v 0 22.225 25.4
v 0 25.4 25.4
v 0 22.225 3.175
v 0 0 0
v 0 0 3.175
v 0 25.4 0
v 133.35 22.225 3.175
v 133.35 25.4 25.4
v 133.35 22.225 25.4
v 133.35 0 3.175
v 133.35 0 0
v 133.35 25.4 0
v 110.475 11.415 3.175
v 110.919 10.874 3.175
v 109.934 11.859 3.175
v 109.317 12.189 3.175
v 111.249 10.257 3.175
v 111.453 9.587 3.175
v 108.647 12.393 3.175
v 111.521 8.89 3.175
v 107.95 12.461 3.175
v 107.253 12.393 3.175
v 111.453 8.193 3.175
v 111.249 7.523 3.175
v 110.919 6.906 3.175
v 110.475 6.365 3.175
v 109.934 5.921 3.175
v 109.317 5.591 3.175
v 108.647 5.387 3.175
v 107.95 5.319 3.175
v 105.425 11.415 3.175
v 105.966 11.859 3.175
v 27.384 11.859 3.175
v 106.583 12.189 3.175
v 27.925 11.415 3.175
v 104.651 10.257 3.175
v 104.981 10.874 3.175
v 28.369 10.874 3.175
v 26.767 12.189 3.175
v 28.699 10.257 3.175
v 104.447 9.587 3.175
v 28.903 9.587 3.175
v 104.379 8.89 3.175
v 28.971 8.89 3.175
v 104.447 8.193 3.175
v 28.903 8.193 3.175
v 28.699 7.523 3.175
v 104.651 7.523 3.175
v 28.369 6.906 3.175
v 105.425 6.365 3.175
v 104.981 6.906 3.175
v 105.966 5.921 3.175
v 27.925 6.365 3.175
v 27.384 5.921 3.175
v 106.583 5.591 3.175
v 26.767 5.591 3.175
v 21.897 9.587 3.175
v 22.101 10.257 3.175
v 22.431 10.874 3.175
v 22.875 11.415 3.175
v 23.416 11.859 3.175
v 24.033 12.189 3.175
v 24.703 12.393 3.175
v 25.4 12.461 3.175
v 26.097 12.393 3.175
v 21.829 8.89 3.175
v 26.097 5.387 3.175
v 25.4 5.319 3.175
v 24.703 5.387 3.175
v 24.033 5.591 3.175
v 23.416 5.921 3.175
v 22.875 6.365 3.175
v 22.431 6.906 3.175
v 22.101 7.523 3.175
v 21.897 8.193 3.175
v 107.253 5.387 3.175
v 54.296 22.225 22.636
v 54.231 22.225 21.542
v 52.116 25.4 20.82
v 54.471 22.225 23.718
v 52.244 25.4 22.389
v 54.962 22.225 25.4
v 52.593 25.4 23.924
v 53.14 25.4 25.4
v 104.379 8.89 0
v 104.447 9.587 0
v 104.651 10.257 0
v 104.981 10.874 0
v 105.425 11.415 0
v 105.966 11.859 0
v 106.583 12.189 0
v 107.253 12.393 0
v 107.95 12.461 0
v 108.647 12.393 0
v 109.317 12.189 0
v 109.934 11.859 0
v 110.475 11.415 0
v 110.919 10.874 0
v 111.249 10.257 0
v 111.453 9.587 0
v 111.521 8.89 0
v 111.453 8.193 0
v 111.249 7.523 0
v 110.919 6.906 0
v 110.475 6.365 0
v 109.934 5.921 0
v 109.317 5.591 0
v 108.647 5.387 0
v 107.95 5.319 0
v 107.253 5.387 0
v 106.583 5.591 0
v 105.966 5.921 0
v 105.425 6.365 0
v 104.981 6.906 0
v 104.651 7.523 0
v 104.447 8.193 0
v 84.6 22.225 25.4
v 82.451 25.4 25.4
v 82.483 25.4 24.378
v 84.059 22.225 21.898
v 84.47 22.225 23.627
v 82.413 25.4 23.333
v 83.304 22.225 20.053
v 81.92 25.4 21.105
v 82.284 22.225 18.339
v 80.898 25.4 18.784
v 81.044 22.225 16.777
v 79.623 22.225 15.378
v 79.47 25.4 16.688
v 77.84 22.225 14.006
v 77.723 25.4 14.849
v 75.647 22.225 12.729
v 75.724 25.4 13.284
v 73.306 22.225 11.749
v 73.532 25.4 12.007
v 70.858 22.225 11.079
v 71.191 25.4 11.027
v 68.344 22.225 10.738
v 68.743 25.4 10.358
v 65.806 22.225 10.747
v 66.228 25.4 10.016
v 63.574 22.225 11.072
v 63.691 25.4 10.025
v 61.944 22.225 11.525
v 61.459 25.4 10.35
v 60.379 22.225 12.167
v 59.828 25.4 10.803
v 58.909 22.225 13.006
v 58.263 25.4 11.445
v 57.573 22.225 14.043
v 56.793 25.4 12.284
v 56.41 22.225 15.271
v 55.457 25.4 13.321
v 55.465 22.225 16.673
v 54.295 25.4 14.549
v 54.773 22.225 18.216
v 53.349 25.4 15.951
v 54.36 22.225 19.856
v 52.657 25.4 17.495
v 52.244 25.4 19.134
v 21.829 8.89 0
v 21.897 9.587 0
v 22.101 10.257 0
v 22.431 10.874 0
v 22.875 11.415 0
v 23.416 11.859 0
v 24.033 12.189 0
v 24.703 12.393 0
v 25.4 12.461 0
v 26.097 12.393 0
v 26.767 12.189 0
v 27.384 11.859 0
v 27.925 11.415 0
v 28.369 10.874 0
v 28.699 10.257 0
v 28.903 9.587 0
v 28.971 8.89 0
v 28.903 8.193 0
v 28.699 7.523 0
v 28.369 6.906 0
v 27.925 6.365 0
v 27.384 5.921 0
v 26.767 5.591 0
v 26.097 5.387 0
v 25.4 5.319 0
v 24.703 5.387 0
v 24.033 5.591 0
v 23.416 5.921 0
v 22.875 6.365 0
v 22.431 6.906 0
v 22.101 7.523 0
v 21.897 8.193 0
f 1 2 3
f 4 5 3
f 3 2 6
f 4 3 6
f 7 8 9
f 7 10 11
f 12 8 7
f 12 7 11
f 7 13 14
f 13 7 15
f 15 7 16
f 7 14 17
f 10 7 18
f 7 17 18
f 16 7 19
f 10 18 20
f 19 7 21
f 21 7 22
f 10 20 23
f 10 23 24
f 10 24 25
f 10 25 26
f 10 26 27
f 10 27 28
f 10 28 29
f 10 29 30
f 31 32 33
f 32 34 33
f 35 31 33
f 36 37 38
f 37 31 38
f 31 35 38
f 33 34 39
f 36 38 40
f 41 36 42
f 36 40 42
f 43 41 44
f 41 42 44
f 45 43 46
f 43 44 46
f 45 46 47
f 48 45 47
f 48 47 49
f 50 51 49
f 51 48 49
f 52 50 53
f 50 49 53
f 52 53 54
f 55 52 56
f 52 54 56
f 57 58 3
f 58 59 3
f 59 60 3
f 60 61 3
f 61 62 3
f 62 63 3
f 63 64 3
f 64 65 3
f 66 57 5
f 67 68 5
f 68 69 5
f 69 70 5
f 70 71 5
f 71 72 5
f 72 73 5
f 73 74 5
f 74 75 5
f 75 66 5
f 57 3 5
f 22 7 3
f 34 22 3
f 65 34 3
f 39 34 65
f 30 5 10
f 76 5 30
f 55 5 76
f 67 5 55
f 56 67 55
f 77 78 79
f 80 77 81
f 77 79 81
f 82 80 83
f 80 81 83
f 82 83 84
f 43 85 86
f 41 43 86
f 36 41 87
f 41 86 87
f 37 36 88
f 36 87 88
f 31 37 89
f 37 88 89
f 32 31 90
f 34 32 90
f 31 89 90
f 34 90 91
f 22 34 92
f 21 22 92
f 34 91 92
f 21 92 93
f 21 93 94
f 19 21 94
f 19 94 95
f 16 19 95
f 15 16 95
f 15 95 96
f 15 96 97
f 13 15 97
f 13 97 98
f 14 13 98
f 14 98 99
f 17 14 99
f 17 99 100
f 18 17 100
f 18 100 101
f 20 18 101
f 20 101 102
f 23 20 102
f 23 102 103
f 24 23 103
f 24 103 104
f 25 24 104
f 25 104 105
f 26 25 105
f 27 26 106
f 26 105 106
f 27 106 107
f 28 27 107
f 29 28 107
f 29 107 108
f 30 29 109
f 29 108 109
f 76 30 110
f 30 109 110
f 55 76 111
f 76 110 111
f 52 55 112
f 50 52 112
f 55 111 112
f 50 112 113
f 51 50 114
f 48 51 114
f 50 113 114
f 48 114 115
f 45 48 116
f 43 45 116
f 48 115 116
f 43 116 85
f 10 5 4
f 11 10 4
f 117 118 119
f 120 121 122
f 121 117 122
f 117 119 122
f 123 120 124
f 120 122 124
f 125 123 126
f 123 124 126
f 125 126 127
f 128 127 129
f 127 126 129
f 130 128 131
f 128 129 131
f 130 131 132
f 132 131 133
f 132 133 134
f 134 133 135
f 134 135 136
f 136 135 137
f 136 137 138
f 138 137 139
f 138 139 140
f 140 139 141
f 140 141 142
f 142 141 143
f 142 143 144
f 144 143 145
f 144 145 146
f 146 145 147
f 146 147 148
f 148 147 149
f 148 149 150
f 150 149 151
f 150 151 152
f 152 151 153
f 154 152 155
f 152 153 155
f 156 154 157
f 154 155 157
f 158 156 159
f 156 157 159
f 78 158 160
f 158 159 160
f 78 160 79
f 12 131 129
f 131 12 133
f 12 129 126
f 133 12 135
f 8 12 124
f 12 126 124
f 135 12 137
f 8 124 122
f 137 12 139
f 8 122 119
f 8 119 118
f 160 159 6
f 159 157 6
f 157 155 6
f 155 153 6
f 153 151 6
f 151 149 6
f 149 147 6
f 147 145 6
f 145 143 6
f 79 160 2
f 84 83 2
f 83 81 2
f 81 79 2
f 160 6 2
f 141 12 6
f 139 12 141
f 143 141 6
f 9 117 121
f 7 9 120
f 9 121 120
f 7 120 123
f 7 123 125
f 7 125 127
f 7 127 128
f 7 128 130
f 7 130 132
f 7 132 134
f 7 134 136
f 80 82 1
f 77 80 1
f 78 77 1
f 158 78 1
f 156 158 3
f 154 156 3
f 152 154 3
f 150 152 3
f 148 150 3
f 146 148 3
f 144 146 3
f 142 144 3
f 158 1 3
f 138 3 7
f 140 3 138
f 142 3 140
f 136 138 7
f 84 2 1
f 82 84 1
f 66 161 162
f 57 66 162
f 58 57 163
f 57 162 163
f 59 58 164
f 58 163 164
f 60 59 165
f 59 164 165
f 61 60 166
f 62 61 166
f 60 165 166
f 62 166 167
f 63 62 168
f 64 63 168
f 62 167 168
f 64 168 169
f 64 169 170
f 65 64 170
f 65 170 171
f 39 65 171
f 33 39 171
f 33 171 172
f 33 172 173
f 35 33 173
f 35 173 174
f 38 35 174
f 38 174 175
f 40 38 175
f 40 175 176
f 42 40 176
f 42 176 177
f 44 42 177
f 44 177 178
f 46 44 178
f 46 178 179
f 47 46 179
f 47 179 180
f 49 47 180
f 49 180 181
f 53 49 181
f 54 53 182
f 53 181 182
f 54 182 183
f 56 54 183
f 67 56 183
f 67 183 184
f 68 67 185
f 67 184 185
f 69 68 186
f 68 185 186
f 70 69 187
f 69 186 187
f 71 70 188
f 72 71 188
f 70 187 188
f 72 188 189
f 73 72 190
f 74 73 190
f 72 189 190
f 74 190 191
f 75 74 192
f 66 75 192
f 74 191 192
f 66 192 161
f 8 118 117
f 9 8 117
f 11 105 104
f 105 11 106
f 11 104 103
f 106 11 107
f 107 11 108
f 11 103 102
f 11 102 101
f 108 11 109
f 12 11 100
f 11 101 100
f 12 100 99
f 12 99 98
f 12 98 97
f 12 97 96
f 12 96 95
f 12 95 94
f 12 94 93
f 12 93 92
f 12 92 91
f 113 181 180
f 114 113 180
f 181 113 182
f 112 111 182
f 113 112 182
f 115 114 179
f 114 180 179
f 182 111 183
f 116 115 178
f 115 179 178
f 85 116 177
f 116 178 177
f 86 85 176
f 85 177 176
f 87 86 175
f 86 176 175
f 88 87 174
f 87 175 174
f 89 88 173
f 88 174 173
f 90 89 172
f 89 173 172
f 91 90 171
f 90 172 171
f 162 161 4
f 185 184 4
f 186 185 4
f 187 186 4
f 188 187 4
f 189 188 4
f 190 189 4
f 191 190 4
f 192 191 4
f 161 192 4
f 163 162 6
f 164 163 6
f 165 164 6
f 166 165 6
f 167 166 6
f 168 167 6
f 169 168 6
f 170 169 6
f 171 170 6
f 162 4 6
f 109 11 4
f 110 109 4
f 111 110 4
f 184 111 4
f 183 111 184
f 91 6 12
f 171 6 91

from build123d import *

# Parameters (mm, degrees)
BOSS_EXTRUDE1_DEPTH = 133.35
SKETCH5_R           = 3.57124
CUT_EXTRUDE1_DEPTH  = 139.103376269


with BuildPart() as part:
    # Sketch1 → Boss-Extrude1 (new body)
    with BuildSketch(Plane(origin=(0, 0, 0), x_dir=(0, 0, -1), z_dir=(1, 0, 0))):
        Polygon((0, 0), (0, 25.4), (-25.4, 25.4), (-25.4, 22.225), (-3.175, 22.225), (-3.175, 0), align=None)
    extrude(amount=BOSS_EXTRUDE1_DEPTH)

    # Cut-Sweep1: read off the stored shape, not the designer's step
    # Cut-Sweep1: loft between two sections, ruled curve by curve
    cut_sweep1_from = [
        Edge.make_bspline([(313.868695545, -367.401209175, 110.125818187), (314.822976006, -368.561544306, 135.48134956), (334.440699372, -352.427576105, 135.48134956), (333.486418911, -351.267240974, 110.125818187), (332.53213845, -350.106905843, 84.770286815), (312.914415084, -366.240874045, 84.770286815), (313.868695545, -367.401209175, 110.125818187)], [0, 0, 0, 0, 0.5, 0.5, 0.5, 1, 1, 1, 1], 3, [1, 0.333333333, 0.333333333, 1, 0.333333333, 0.333333333, 1]),
    ]
    cut_sweep1_to = [
        Edge.make_bspline([(-146.659751189, 323.693531683, -46.998545783), (-145.705470727, 322.533196552, -21.64301441), (-126.087747361, 338.667164754, -21.64301441), (-127.042027823, 339.827499885, -46.998545783), (-127.996308284, 340.987835016, -72.354077155), (-147.61403165, 324.853866814, -72.354077155), (-146.659751189, 323.693531683, -46.998545783)], [0, 0, 0, 0, 0.5, 0.5, 0.5, 1, 1, 1, 1], 3, [1, 0.333333333, 0.333333333, 1, 0.333333333, 0.333333333, 1]),
    ]
    cut_sweep1 = Solid(Shell([*[Face.make_surface_from_curves(cut_sweep1_from[k], cut_sweep1_to[k]) for k in range(1)], Face(Wire(cut_sweep1_from)), Face(Wire(cut_sweep1_to))]))
    add(cut_sweep1, mode=Mode.SUBTRACT)

    # Sketch5 → Cut-Extrude1 (cut, through all)
    with BuildSketch(Plane(origin=(0, 0, 0), x_dir=(-1, 0, 0), z_dir=(0, 0, -1))):
        with Locations((-107.95, 8.89)):
            Circle(SKETCH5_R)
        with Locations((-25.4, 8.89)):
            Circle(SKETCH5_R)
    extrude(amount=-CUT_EXTRUDE1_DEPTH, mode=Mode.SUBTRACT)


solid = part.part
